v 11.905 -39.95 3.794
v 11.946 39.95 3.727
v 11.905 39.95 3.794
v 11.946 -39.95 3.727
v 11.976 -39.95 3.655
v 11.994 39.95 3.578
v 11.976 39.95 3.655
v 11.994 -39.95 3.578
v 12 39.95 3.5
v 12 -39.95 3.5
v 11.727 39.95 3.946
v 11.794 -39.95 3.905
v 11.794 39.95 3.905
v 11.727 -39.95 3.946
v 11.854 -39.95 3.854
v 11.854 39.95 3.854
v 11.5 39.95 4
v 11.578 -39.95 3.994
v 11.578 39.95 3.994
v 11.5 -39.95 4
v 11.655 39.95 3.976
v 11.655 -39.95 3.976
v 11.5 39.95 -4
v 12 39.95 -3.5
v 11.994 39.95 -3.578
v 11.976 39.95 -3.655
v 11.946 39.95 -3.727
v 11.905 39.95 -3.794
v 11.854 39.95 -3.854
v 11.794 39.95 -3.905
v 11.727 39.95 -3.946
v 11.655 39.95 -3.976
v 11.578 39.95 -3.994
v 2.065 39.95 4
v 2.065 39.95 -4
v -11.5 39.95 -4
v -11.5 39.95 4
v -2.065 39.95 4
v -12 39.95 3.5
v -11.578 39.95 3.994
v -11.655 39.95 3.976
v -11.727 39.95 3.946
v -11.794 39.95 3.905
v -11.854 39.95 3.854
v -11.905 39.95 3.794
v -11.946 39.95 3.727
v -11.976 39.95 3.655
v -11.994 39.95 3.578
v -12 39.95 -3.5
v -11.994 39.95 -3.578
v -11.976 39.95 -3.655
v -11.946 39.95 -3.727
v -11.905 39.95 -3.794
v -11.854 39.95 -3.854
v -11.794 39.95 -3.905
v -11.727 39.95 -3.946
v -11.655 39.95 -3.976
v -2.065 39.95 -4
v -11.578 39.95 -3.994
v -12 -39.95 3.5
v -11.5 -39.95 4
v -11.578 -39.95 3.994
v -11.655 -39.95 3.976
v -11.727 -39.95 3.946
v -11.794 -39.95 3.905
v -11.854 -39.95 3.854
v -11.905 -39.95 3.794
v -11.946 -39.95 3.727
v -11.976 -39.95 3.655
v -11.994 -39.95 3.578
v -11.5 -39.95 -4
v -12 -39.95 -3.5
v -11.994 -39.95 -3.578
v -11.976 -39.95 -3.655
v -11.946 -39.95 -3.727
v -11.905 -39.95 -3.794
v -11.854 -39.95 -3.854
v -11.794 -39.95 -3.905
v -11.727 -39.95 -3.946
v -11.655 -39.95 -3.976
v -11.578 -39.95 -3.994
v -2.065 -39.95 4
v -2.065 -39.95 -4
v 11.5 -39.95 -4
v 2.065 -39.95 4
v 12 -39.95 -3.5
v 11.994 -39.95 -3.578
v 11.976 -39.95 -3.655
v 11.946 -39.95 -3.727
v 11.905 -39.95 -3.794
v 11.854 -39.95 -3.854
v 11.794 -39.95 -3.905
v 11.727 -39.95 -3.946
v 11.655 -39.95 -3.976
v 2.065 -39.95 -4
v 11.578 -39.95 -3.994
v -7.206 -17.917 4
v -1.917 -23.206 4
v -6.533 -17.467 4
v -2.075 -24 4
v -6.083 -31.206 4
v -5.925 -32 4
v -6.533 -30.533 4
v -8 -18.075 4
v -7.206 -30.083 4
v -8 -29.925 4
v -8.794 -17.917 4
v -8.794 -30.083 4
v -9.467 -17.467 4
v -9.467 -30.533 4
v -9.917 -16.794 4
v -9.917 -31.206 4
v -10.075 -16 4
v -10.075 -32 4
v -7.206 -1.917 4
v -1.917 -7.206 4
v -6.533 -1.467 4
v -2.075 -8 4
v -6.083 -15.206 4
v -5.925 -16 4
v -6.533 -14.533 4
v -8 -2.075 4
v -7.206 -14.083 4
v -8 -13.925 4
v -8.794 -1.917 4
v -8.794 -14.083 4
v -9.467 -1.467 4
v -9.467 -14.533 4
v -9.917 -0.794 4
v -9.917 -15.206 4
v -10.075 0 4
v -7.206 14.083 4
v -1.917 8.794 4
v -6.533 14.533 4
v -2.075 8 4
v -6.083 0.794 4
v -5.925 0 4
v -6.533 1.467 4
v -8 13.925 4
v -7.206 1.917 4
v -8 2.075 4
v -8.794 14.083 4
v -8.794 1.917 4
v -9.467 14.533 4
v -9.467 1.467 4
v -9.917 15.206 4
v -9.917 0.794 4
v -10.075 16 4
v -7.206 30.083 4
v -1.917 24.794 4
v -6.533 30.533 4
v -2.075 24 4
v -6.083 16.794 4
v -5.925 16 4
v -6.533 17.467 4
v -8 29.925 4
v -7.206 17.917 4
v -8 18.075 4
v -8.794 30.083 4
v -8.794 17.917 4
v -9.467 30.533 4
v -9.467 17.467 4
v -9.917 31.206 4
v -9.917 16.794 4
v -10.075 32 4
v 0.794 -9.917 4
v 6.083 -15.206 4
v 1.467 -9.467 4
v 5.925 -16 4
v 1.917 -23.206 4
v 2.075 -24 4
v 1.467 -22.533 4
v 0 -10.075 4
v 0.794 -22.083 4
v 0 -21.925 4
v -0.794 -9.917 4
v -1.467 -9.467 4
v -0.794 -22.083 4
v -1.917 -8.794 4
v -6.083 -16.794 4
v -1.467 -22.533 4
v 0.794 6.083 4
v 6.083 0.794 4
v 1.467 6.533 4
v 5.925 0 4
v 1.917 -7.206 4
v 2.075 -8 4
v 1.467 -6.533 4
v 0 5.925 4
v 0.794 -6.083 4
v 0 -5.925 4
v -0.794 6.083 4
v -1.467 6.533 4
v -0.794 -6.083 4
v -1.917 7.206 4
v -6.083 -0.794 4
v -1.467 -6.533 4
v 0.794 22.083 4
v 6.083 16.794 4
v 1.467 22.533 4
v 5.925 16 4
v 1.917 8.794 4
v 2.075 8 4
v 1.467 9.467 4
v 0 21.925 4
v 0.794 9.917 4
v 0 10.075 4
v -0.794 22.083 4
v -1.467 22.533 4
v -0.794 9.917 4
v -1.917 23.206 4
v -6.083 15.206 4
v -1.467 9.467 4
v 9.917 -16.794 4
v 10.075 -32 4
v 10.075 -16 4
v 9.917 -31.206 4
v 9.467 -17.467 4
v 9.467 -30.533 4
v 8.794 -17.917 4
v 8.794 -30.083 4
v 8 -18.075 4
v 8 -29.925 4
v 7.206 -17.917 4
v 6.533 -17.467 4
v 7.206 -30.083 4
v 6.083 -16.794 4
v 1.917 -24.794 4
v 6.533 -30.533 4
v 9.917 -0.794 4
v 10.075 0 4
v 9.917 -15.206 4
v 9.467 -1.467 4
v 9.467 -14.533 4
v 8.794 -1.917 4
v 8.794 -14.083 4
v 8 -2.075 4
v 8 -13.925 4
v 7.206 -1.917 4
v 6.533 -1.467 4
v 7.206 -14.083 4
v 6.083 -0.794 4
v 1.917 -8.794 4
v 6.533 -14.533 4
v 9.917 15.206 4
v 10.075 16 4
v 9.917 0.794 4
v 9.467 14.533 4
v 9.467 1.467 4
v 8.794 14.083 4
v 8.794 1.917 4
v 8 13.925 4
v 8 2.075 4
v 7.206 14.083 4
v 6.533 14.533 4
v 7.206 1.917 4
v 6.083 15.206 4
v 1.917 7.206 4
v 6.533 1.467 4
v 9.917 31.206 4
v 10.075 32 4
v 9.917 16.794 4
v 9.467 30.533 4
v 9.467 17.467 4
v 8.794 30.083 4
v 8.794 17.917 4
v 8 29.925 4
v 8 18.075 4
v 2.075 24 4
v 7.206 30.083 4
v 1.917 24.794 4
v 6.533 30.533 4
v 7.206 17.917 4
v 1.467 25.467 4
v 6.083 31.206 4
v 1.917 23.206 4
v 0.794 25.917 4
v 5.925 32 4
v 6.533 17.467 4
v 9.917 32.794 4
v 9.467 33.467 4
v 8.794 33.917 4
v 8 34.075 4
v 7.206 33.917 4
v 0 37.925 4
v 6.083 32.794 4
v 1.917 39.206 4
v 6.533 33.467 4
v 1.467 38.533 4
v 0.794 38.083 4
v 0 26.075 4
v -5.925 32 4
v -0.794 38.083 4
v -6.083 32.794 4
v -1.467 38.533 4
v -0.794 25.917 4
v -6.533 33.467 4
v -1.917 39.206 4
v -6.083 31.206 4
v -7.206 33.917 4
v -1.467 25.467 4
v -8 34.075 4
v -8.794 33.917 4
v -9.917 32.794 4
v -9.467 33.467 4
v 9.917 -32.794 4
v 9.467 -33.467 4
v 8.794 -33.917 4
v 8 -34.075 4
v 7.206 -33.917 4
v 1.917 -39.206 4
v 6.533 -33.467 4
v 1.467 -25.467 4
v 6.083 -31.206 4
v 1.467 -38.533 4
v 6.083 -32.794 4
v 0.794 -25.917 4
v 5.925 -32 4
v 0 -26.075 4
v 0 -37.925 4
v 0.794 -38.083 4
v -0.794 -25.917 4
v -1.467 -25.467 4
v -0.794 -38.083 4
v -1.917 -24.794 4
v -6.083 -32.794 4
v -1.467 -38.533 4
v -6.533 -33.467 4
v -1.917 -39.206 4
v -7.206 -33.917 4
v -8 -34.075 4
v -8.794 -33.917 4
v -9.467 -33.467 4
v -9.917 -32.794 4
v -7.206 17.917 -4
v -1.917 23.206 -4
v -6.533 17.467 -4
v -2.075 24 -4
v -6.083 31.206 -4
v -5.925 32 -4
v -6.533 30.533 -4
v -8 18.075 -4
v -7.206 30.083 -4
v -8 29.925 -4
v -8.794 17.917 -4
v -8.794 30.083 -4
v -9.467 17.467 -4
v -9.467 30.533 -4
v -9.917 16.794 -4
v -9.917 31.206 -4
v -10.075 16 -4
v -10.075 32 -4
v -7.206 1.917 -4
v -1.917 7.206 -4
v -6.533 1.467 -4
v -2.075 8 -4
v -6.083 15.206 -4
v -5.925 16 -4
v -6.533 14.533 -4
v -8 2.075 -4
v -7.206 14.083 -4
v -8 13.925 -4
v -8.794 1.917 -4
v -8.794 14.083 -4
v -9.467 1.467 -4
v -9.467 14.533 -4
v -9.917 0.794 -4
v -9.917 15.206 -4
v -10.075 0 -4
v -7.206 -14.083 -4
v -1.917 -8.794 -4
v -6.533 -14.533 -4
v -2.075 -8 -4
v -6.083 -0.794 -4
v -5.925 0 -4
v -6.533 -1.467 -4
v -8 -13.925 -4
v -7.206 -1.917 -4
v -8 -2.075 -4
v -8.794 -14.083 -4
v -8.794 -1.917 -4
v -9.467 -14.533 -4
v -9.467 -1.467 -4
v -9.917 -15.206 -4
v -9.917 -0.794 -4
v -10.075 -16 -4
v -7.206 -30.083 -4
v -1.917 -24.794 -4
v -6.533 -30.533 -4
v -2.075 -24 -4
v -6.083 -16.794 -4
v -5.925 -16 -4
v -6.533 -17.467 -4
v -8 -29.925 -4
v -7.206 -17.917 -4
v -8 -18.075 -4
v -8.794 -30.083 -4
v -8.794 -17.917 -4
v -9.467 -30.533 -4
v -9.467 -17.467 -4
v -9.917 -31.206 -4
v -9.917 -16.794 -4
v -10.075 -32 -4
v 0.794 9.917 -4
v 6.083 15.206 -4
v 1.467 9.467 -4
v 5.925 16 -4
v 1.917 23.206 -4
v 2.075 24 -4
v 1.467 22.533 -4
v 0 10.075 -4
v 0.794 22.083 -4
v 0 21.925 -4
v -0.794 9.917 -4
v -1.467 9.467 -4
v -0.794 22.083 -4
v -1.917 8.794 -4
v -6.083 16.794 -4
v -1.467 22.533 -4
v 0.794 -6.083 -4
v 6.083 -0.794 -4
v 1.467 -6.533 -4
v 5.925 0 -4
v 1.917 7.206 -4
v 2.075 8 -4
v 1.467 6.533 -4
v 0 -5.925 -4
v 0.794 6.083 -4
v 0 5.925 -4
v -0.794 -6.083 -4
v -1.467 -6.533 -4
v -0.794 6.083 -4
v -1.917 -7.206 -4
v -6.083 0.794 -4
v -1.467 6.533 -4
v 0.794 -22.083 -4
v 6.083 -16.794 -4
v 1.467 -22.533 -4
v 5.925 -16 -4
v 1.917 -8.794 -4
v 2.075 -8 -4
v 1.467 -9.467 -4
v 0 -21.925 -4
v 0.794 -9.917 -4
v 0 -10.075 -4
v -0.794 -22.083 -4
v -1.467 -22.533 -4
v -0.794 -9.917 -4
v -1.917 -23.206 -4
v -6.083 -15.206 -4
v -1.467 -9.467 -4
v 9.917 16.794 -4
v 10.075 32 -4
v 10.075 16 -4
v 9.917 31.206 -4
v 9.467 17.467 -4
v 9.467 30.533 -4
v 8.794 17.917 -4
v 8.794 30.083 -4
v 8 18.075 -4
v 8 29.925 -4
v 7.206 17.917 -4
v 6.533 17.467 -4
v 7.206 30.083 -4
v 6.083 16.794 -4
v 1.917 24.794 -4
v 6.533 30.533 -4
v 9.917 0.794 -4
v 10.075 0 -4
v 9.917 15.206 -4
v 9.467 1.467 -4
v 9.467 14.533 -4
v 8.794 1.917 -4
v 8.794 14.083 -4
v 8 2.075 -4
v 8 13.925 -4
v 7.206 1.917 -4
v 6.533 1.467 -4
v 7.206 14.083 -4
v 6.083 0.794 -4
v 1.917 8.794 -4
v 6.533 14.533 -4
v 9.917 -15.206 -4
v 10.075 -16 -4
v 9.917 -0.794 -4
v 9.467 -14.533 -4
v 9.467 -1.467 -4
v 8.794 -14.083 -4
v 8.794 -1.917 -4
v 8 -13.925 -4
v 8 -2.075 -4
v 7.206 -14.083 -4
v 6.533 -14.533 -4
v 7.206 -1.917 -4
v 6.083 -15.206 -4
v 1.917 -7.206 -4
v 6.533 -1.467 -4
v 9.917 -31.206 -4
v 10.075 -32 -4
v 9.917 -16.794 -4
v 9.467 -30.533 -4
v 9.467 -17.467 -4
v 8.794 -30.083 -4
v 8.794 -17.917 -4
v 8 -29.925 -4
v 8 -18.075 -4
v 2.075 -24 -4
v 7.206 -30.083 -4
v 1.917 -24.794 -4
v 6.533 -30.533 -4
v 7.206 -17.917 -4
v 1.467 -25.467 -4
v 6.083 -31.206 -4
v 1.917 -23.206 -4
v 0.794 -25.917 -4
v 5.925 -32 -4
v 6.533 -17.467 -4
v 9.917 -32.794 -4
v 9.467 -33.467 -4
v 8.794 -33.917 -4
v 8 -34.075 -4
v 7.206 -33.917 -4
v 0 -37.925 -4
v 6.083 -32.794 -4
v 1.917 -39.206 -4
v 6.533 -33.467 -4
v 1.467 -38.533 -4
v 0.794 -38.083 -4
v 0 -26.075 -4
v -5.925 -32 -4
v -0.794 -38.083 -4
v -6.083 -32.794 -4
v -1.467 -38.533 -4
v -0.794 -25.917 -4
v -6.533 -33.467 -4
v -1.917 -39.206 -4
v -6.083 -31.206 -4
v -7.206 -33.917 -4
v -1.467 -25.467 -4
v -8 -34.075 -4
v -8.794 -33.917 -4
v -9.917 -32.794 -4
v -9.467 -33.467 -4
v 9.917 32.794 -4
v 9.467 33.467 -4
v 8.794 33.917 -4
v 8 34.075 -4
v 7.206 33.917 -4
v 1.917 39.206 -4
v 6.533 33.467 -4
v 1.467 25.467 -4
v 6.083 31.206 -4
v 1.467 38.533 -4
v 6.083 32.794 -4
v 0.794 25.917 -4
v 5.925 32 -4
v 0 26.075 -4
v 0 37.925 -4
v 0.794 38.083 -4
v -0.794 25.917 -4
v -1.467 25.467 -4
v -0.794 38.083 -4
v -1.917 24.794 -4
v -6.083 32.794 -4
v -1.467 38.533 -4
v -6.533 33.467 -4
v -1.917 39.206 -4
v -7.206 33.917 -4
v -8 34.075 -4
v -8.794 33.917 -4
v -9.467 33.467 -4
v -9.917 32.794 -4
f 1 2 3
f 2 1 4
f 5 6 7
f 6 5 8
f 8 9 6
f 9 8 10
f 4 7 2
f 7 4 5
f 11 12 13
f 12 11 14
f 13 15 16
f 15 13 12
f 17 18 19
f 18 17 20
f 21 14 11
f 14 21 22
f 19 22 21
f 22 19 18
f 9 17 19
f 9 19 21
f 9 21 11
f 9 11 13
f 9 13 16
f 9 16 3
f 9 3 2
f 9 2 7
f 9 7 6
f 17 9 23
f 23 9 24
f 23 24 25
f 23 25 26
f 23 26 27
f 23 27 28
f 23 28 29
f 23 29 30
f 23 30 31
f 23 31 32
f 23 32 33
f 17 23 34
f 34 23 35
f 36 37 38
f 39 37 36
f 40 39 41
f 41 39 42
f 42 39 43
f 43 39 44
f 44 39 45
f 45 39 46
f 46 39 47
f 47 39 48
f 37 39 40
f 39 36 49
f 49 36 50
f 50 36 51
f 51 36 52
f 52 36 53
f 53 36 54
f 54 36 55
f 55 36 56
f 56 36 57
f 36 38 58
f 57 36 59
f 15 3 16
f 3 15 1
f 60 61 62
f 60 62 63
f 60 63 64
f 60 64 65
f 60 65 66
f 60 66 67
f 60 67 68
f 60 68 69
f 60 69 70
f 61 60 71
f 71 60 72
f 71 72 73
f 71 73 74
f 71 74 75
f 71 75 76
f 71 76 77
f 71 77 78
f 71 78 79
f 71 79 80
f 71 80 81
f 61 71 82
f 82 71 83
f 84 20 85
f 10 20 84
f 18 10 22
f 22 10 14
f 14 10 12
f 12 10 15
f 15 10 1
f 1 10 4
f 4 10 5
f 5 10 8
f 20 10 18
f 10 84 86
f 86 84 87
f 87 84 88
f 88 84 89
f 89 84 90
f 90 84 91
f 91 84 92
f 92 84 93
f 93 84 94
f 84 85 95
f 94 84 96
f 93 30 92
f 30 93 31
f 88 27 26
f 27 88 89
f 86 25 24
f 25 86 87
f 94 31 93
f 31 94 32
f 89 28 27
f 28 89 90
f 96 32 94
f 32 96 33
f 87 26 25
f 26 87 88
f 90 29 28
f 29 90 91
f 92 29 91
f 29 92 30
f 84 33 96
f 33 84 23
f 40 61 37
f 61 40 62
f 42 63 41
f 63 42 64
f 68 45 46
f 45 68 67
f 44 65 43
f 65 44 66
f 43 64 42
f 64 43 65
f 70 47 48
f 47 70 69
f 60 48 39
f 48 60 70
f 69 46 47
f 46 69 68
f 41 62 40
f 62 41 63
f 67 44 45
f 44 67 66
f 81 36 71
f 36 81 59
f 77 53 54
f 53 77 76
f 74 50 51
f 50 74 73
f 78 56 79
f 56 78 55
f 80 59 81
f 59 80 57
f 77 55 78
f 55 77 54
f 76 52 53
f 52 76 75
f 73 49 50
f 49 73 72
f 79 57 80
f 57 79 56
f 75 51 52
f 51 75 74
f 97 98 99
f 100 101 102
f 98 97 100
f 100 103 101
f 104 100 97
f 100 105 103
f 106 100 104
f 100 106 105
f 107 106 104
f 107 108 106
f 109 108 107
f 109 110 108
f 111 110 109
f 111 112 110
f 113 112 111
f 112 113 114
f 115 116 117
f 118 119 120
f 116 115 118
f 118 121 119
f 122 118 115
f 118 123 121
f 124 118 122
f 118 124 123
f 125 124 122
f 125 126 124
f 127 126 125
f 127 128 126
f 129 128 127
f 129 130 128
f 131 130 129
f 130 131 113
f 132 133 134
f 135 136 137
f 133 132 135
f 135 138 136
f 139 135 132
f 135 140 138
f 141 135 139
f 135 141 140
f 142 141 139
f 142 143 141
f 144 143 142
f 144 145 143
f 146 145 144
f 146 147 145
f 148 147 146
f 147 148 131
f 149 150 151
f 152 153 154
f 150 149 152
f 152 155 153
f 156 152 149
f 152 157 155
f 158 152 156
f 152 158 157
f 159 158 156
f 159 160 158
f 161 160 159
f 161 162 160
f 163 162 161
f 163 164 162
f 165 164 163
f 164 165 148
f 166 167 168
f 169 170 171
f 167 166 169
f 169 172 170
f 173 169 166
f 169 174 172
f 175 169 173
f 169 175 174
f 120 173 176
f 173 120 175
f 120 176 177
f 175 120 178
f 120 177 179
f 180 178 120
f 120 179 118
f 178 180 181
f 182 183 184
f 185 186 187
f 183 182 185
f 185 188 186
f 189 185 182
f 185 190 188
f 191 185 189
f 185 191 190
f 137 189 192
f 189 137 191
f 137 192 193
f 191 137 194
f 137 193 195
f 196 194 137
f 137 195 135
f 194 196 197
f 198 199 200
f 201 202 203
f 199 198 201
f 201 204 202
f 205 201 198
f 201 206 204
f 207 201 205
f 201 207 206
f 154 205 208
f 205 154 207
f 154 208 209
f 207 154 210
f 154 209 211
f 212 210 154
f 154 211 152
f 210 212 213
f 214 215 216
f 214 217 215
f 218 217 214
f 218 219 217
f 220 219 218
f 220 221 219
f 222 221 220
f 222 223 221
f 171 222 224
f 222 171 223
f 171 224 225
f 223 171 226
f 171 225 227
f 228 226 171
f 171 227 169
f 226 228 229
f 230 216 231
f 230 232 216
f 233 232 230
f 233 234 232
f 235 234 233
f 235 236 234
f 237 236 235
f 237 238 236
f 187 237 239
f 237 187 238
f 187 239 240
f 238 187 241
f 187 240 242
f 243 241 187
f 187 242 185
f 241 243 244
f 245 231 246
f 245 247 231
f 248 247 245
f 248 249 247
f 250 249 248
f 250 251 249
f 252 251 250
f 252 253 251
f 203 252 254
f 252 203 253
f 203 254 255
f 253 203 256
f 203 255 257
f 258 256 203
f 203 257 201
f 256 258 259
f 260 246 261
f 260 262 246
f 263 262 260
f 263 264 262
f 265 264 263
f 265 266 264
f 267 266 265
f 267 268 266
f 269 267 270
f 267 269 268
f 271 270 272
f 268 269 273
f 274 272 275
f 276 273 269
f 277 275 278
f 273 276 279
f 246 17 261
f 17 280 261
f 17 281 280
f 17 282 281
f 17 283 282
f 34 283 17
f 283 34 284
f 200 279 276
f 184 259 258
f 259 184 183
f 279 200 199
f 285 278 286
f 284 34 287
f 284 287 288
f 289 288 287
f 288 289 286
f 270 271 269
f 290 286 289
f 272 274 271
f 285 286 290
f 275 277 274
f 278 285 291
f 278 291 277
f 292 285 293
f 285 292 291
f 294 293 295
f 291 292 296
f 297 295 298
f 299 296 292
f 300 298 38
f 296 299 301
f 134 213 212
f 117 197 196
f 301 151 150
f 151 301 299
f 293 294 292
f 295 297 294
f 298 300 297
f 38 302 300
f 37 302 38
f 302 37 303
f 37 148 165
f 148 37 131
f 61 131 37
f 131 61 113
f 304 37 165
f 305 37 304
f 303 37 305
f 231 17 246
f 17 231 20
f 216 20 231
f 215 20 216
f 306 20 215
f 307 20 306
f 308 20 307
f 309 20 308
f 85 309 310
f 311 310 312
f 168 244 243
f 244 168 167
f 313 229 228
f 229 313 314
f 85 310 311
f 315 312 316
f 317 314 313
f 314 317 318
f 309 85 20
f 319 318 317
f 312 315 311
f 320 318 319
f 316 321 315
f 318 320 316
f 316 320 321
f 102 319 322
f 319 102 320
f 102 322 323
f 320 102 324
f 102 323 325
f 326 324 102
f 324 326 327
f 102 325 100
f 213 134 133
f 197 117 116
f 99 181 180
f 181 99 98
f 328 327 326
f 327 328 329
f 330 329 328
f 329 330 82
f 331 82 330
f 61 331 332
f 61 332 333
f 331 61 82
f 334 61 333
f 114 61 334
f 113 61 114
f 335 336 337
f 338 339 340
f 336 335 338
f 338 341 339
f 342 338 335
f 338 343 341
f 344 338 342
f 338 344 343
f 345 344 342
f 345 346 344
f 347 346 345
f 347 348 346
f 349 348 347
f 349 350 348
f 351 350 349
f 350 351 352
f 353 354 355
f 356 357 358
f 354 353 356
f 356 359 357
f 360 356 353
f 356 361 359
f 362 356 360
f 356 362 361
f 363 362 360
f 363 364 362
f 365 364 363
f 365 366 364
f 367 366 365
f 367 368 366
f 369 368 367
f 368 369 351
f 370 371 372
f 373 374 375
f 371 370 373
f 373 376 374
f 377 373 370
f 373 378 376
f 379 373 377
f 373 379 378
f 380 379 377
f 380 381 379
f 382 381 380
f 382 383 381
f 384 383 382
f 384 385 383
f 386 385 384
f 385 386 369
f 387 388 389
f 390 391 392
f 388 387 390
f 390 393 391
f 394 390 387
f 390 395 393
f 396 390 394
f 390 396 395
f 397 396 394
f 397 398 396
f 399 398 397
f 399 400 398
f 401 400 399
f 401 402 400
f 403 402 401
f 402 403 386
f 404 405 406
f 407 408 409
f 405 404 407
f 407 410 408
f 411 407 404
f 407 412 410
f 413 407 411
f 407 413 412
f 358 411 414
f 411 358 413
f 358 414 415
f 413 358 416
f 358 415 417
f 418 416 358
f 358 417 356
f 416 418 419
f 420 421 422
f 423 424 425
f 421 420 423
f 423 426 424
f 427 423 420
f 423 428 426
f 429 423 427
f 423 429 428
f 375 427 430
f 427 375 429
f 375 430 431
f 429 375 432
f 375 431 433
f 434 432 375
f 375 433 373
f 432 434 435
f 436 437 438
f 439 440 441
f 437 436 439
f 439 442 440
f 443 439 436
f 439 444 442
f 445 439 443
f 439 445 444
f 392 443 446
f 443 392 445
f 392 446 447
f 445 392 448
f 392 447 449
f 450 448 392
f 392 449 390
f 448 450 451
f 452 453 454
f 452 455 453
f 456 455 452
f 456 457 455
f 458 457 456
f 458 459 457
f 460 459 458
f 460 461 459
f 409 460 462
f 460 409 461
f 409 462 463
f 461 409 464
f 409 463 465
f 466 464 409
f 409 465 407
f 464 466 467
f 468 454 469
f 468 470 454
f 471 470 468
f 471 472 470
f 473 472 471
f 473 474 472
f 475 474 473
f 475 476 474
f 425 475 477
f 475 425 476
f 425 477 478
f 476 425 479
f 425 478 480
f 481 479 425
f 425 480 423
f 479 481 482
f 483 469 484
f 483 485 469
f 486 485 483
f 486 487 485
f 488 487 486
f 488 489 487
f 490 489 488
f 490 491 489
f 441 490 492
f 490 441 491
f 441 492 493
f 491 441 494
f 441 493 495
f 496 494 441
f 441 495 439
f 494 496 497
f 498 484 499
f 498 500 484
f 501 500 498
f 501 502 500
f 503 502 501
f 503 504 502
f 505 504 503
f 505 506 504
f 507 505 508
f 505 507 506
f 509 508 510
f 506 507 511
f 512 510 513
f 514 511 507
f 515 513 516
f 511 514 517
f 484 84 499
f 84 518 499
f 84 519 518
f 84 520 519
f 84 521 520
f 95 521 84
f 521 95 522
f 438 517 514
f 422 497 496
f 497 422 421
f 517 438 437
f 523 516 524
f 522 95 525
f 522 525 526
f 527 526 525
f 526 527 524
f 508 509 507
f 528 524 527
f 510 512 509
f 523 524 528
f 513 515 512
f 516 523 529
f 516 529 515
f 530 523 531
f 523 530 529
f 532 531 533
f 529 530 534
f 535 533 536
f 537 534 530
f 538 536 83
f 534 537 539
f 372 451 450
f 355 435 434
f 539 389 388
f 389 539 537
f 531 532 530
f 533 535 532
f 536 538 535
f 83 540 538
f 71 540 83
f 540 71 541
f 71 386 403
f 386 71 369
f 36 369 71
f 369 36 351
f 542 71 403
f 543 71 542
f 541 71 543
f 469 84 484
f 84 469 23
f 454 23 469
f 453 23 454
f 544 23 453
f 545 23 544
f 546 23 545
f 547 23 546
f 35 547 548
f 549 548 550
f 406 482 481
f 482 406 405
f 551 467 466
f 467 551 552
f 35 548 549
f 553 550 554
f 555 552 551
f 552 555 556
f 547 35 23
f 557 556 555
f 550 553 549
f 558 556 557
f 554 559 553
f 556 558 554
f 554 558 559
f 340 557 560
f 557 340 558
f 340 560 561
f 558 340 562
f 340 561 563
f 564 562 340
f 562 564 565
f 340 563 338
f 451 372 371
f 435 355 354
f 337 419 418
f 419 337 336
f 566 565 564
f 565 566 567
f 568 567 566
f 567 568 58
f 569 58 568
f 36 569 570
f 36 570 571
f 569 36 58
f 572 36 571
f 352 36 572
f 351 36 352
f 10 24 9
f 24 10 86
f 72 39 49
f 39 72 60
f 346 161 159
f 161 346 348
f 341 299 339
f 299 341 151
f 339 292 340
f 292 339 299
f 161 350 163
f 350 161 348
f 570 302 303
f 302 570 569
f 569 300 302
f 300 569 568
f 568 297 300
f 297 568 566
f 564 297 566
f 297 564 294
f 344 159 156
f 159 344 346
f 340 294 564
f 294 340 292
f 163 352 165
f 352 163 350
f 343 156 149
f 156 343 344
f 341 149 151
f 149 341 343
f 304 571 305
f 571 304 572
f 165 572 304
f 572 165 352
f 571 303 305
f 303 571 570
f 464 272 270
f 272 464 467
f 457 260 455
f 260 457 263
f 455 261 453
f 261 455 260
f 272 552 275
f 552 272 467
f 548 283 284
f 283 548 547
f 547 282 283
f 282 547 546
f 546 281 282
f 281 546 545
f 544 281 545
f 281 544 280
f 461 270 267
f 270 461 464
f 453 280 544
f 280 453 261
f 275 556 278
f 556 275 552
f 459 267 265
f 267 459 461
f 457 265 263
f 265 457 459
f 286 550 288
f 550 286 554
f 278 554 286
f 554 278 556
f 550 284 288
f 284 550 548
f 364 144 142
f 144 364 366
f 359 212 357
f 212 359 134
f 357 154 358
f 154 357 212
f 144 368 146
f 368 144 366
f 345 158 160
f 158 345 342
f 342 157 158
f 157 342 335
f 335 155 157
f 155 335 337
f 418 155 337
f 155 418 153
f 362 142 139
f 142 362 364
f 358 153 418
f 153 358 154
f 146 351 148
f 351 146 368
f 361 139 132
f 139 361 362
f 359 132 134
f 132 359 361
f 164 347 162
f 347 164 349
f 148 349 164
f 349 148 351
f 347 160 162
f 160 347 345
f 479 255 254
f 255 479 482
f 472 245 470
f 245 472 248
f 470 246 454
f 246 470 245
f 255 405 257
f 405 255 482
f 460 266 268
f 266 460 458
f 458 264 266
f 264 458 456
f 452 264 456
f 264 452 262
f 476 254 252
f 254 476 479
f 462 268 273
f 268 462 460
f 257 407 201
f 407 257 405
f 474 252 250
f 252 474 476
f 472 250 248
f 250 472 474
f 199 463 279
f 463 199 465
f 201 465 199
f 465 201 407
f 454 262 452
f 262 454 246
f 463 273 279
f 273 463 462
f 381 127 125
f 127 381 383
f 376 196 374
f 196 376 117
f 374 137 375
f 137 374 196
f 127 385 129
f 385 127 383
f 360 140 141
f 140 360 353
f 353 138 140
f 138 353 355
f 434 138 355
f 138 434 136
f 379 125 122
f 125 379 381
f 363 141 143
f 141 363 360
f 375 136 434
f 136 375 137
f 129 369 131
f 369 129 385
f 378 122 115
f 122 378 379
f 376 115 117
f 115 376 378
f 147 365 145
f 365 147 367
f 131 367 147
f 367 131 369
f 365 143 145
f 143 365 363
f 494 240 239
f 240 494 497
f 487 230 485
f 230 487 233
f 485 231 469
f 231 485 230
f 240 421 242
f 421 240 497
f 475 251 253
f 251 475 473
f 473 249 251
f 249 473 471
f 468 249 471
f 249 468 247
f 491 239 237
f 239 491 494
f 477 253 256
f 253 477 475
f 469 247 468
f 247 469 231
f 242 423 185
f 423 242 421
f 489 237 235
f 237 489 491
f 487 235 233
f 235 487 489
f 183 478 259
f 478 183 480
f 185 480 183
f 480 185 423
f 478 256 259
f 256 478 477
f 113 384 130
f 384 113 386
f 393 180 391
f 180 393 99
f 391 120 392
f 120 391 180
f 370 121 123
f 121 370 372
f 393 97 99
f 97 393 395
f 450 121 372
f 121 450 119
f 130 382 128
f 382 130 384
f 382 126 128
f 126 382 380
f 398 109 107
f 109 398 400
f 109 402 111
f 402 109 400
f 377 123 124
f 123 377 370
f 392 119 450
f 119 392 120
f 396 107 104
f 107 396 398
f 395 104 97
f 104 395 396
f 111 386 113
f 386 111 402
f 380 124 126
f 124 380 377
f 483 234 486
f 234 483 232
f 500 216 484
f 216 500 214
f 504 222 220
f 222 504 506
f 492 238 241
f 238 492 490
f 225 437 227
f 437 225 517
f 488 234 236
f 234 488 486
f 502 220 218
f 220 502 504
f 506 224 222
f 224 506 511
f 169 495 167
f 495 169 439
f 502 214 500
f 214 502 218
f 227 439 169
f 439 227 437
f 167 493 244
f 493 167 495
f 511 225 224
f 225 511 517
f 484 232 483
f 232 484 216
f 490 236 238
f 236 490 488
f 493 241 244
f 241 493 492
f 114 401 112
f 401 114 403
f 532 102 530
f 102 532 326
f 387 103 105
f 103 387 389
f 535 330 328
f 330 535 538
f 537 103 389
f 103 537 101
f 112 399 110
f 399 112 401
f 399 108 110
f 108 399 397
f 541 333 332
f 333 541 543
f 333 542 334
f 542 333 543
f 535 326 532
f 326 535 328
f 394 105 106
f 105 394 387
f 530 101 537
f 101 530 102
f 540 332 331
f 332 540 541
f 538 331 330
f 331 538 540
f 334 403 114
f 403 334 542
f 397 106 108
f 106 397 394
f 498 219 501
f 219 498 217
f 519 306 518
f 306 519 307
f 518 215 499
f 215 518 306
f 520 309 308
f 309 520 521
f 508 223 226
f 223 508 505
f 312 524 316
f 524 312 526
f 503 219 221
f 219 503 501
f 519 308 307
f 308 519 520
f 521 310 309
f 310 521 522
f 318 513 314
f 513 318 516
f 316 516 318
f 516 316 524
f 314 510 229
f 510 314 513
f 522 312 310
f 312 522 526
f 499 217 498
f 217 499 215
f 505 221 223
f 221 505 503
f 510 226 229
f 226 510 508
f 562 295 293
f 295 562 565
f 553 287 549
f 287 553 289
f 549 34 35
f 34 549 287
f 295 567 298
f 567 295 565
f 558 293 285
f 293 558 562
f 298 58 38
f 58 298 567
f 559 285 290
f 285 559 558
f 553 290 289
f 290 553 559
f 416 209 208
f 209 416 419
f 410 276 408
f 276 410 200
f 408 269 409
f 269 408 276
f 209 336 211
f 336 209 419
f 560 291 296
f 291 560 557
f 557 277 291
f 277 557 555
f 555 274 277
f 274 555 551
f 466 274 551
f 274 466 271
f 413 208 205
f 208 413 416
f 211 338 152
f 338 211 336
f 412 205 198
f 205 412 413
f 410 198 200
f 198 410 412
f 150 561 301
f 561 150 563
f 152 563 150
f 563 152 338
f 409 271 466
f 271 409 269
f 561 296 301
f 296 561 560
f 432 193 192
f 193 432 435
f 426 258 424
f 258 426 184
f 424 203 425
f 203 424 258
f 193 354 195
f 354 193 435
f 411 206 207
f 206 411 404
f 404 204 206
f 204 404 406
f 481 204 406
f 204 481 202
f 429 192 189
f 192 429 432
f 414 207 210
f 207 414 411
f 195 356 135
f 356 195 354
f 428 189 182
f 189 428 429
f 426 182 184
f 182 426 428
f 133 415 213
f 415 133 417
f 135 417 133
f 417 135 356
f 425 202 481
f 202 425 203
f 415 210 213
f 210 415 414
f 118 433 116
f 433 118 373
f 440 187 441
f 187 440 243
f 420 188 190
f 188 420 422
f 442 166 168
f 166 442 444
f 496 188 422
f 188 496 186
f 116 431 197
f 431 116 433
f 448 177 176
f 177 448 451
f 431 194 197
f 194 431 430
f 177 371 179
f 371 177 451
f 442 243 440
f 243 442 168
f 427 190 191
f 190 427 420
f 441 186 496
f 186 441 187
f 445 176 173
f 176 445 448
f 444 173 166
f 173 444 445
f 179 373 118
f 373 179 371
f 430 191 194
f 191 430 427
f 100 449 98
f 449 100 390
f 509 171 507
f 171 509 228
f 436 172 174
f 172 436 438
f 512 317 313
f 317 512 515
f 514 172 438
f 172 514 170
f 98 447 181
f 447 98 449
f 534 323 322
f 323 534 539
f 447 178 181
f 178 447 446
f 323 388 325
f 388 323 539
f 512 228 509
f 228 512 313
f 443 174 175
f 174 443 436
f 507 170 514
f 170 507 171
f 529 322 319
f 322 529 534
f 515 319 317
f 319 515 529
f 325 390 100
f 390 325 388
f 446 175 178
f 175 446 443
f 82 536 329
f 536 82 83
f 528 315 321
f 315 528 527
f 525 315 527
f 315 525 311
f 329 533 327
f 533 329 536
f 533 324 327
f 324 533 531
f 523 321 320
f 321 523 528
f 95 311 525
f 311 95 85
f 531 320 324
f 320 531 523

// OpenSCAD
// Created by Heindal at Thingiverse on March 2015

// Values for user to edit

// Length of extrusion
length = 80; // [16,32,48,64,80,96,112,128,144,160,176,192]
// Diameter of holes in extrusion
holeDia = 4.15; // [3.4:3.4mm for Tap, 4.15:4.15mm for Tight Fit, 4.3:4.3mm for Loose Fit]

/* [Hidden] */
//Number of rows of holes in extrusion
rowCount = floor(length/16);
// Calculated values - edit at your own risk
outsideWidth = 8;
outsideHeight = 24;
outsideLength = 16*rowCount-0.1;

module rounded_box(l,w,h,r_edge){

cube(size=[l-2*r_edge,w-2*r_edge,h ],center=true);

for (x = [l/2-r_edge,-(l/2-r_edge) ]) {
	for (y = [(w/2-r_edge),-(w/2-r_edge)]) {
		translate([x,y,0]) cylinder(r1=r_edge,r2=r_edge,h=h,center=true,$fn=40);
	}
}
translate([0,w/2-r_edge,0]) cube(size=[l-2*r_edge,2*r_edge,h ],center=true);
translate([0,-(w/2-r_edge),0]) cube(size=[l-2*r_edge,2*r_edge,h ],center=true);
translate([(l/2-r_edge),0,0]) cube(size=[2*r_edge,w-2*r_edge,h ],center=true);
translate([-(l/2-r_edge),0,0]) cube(size=[2*r_edge,w-2*r_edge,h ],center=true);

}

rotate([90,0,0]) {
	difference() {
		rounded_box(outsideHeight,outsideWidth, outsideLength, 0.5);
		// mounting holes to match the rail
		for (z = [-16*(rowCount-1)/2 : 16 : 16*(rowCount-1)/2]) {
			for (x = [-8,8]) {
				translate([x,0,z]) rotate([90,0,0]) cylinder(r=holeDia/2, h=outsideWidth+1, center=true, $fn=16);
			}
		}
		// mounting holes to match center slot
		for (z =  [-16*rowCount/2 : 16 : 16*rowCount/2]) {
				translate([0,0,z]) rotate([90,0,0]) cylinder(r=holeDia/2, h=outsideWidth+1, center=true, $fn=16);
		}
	}
}
